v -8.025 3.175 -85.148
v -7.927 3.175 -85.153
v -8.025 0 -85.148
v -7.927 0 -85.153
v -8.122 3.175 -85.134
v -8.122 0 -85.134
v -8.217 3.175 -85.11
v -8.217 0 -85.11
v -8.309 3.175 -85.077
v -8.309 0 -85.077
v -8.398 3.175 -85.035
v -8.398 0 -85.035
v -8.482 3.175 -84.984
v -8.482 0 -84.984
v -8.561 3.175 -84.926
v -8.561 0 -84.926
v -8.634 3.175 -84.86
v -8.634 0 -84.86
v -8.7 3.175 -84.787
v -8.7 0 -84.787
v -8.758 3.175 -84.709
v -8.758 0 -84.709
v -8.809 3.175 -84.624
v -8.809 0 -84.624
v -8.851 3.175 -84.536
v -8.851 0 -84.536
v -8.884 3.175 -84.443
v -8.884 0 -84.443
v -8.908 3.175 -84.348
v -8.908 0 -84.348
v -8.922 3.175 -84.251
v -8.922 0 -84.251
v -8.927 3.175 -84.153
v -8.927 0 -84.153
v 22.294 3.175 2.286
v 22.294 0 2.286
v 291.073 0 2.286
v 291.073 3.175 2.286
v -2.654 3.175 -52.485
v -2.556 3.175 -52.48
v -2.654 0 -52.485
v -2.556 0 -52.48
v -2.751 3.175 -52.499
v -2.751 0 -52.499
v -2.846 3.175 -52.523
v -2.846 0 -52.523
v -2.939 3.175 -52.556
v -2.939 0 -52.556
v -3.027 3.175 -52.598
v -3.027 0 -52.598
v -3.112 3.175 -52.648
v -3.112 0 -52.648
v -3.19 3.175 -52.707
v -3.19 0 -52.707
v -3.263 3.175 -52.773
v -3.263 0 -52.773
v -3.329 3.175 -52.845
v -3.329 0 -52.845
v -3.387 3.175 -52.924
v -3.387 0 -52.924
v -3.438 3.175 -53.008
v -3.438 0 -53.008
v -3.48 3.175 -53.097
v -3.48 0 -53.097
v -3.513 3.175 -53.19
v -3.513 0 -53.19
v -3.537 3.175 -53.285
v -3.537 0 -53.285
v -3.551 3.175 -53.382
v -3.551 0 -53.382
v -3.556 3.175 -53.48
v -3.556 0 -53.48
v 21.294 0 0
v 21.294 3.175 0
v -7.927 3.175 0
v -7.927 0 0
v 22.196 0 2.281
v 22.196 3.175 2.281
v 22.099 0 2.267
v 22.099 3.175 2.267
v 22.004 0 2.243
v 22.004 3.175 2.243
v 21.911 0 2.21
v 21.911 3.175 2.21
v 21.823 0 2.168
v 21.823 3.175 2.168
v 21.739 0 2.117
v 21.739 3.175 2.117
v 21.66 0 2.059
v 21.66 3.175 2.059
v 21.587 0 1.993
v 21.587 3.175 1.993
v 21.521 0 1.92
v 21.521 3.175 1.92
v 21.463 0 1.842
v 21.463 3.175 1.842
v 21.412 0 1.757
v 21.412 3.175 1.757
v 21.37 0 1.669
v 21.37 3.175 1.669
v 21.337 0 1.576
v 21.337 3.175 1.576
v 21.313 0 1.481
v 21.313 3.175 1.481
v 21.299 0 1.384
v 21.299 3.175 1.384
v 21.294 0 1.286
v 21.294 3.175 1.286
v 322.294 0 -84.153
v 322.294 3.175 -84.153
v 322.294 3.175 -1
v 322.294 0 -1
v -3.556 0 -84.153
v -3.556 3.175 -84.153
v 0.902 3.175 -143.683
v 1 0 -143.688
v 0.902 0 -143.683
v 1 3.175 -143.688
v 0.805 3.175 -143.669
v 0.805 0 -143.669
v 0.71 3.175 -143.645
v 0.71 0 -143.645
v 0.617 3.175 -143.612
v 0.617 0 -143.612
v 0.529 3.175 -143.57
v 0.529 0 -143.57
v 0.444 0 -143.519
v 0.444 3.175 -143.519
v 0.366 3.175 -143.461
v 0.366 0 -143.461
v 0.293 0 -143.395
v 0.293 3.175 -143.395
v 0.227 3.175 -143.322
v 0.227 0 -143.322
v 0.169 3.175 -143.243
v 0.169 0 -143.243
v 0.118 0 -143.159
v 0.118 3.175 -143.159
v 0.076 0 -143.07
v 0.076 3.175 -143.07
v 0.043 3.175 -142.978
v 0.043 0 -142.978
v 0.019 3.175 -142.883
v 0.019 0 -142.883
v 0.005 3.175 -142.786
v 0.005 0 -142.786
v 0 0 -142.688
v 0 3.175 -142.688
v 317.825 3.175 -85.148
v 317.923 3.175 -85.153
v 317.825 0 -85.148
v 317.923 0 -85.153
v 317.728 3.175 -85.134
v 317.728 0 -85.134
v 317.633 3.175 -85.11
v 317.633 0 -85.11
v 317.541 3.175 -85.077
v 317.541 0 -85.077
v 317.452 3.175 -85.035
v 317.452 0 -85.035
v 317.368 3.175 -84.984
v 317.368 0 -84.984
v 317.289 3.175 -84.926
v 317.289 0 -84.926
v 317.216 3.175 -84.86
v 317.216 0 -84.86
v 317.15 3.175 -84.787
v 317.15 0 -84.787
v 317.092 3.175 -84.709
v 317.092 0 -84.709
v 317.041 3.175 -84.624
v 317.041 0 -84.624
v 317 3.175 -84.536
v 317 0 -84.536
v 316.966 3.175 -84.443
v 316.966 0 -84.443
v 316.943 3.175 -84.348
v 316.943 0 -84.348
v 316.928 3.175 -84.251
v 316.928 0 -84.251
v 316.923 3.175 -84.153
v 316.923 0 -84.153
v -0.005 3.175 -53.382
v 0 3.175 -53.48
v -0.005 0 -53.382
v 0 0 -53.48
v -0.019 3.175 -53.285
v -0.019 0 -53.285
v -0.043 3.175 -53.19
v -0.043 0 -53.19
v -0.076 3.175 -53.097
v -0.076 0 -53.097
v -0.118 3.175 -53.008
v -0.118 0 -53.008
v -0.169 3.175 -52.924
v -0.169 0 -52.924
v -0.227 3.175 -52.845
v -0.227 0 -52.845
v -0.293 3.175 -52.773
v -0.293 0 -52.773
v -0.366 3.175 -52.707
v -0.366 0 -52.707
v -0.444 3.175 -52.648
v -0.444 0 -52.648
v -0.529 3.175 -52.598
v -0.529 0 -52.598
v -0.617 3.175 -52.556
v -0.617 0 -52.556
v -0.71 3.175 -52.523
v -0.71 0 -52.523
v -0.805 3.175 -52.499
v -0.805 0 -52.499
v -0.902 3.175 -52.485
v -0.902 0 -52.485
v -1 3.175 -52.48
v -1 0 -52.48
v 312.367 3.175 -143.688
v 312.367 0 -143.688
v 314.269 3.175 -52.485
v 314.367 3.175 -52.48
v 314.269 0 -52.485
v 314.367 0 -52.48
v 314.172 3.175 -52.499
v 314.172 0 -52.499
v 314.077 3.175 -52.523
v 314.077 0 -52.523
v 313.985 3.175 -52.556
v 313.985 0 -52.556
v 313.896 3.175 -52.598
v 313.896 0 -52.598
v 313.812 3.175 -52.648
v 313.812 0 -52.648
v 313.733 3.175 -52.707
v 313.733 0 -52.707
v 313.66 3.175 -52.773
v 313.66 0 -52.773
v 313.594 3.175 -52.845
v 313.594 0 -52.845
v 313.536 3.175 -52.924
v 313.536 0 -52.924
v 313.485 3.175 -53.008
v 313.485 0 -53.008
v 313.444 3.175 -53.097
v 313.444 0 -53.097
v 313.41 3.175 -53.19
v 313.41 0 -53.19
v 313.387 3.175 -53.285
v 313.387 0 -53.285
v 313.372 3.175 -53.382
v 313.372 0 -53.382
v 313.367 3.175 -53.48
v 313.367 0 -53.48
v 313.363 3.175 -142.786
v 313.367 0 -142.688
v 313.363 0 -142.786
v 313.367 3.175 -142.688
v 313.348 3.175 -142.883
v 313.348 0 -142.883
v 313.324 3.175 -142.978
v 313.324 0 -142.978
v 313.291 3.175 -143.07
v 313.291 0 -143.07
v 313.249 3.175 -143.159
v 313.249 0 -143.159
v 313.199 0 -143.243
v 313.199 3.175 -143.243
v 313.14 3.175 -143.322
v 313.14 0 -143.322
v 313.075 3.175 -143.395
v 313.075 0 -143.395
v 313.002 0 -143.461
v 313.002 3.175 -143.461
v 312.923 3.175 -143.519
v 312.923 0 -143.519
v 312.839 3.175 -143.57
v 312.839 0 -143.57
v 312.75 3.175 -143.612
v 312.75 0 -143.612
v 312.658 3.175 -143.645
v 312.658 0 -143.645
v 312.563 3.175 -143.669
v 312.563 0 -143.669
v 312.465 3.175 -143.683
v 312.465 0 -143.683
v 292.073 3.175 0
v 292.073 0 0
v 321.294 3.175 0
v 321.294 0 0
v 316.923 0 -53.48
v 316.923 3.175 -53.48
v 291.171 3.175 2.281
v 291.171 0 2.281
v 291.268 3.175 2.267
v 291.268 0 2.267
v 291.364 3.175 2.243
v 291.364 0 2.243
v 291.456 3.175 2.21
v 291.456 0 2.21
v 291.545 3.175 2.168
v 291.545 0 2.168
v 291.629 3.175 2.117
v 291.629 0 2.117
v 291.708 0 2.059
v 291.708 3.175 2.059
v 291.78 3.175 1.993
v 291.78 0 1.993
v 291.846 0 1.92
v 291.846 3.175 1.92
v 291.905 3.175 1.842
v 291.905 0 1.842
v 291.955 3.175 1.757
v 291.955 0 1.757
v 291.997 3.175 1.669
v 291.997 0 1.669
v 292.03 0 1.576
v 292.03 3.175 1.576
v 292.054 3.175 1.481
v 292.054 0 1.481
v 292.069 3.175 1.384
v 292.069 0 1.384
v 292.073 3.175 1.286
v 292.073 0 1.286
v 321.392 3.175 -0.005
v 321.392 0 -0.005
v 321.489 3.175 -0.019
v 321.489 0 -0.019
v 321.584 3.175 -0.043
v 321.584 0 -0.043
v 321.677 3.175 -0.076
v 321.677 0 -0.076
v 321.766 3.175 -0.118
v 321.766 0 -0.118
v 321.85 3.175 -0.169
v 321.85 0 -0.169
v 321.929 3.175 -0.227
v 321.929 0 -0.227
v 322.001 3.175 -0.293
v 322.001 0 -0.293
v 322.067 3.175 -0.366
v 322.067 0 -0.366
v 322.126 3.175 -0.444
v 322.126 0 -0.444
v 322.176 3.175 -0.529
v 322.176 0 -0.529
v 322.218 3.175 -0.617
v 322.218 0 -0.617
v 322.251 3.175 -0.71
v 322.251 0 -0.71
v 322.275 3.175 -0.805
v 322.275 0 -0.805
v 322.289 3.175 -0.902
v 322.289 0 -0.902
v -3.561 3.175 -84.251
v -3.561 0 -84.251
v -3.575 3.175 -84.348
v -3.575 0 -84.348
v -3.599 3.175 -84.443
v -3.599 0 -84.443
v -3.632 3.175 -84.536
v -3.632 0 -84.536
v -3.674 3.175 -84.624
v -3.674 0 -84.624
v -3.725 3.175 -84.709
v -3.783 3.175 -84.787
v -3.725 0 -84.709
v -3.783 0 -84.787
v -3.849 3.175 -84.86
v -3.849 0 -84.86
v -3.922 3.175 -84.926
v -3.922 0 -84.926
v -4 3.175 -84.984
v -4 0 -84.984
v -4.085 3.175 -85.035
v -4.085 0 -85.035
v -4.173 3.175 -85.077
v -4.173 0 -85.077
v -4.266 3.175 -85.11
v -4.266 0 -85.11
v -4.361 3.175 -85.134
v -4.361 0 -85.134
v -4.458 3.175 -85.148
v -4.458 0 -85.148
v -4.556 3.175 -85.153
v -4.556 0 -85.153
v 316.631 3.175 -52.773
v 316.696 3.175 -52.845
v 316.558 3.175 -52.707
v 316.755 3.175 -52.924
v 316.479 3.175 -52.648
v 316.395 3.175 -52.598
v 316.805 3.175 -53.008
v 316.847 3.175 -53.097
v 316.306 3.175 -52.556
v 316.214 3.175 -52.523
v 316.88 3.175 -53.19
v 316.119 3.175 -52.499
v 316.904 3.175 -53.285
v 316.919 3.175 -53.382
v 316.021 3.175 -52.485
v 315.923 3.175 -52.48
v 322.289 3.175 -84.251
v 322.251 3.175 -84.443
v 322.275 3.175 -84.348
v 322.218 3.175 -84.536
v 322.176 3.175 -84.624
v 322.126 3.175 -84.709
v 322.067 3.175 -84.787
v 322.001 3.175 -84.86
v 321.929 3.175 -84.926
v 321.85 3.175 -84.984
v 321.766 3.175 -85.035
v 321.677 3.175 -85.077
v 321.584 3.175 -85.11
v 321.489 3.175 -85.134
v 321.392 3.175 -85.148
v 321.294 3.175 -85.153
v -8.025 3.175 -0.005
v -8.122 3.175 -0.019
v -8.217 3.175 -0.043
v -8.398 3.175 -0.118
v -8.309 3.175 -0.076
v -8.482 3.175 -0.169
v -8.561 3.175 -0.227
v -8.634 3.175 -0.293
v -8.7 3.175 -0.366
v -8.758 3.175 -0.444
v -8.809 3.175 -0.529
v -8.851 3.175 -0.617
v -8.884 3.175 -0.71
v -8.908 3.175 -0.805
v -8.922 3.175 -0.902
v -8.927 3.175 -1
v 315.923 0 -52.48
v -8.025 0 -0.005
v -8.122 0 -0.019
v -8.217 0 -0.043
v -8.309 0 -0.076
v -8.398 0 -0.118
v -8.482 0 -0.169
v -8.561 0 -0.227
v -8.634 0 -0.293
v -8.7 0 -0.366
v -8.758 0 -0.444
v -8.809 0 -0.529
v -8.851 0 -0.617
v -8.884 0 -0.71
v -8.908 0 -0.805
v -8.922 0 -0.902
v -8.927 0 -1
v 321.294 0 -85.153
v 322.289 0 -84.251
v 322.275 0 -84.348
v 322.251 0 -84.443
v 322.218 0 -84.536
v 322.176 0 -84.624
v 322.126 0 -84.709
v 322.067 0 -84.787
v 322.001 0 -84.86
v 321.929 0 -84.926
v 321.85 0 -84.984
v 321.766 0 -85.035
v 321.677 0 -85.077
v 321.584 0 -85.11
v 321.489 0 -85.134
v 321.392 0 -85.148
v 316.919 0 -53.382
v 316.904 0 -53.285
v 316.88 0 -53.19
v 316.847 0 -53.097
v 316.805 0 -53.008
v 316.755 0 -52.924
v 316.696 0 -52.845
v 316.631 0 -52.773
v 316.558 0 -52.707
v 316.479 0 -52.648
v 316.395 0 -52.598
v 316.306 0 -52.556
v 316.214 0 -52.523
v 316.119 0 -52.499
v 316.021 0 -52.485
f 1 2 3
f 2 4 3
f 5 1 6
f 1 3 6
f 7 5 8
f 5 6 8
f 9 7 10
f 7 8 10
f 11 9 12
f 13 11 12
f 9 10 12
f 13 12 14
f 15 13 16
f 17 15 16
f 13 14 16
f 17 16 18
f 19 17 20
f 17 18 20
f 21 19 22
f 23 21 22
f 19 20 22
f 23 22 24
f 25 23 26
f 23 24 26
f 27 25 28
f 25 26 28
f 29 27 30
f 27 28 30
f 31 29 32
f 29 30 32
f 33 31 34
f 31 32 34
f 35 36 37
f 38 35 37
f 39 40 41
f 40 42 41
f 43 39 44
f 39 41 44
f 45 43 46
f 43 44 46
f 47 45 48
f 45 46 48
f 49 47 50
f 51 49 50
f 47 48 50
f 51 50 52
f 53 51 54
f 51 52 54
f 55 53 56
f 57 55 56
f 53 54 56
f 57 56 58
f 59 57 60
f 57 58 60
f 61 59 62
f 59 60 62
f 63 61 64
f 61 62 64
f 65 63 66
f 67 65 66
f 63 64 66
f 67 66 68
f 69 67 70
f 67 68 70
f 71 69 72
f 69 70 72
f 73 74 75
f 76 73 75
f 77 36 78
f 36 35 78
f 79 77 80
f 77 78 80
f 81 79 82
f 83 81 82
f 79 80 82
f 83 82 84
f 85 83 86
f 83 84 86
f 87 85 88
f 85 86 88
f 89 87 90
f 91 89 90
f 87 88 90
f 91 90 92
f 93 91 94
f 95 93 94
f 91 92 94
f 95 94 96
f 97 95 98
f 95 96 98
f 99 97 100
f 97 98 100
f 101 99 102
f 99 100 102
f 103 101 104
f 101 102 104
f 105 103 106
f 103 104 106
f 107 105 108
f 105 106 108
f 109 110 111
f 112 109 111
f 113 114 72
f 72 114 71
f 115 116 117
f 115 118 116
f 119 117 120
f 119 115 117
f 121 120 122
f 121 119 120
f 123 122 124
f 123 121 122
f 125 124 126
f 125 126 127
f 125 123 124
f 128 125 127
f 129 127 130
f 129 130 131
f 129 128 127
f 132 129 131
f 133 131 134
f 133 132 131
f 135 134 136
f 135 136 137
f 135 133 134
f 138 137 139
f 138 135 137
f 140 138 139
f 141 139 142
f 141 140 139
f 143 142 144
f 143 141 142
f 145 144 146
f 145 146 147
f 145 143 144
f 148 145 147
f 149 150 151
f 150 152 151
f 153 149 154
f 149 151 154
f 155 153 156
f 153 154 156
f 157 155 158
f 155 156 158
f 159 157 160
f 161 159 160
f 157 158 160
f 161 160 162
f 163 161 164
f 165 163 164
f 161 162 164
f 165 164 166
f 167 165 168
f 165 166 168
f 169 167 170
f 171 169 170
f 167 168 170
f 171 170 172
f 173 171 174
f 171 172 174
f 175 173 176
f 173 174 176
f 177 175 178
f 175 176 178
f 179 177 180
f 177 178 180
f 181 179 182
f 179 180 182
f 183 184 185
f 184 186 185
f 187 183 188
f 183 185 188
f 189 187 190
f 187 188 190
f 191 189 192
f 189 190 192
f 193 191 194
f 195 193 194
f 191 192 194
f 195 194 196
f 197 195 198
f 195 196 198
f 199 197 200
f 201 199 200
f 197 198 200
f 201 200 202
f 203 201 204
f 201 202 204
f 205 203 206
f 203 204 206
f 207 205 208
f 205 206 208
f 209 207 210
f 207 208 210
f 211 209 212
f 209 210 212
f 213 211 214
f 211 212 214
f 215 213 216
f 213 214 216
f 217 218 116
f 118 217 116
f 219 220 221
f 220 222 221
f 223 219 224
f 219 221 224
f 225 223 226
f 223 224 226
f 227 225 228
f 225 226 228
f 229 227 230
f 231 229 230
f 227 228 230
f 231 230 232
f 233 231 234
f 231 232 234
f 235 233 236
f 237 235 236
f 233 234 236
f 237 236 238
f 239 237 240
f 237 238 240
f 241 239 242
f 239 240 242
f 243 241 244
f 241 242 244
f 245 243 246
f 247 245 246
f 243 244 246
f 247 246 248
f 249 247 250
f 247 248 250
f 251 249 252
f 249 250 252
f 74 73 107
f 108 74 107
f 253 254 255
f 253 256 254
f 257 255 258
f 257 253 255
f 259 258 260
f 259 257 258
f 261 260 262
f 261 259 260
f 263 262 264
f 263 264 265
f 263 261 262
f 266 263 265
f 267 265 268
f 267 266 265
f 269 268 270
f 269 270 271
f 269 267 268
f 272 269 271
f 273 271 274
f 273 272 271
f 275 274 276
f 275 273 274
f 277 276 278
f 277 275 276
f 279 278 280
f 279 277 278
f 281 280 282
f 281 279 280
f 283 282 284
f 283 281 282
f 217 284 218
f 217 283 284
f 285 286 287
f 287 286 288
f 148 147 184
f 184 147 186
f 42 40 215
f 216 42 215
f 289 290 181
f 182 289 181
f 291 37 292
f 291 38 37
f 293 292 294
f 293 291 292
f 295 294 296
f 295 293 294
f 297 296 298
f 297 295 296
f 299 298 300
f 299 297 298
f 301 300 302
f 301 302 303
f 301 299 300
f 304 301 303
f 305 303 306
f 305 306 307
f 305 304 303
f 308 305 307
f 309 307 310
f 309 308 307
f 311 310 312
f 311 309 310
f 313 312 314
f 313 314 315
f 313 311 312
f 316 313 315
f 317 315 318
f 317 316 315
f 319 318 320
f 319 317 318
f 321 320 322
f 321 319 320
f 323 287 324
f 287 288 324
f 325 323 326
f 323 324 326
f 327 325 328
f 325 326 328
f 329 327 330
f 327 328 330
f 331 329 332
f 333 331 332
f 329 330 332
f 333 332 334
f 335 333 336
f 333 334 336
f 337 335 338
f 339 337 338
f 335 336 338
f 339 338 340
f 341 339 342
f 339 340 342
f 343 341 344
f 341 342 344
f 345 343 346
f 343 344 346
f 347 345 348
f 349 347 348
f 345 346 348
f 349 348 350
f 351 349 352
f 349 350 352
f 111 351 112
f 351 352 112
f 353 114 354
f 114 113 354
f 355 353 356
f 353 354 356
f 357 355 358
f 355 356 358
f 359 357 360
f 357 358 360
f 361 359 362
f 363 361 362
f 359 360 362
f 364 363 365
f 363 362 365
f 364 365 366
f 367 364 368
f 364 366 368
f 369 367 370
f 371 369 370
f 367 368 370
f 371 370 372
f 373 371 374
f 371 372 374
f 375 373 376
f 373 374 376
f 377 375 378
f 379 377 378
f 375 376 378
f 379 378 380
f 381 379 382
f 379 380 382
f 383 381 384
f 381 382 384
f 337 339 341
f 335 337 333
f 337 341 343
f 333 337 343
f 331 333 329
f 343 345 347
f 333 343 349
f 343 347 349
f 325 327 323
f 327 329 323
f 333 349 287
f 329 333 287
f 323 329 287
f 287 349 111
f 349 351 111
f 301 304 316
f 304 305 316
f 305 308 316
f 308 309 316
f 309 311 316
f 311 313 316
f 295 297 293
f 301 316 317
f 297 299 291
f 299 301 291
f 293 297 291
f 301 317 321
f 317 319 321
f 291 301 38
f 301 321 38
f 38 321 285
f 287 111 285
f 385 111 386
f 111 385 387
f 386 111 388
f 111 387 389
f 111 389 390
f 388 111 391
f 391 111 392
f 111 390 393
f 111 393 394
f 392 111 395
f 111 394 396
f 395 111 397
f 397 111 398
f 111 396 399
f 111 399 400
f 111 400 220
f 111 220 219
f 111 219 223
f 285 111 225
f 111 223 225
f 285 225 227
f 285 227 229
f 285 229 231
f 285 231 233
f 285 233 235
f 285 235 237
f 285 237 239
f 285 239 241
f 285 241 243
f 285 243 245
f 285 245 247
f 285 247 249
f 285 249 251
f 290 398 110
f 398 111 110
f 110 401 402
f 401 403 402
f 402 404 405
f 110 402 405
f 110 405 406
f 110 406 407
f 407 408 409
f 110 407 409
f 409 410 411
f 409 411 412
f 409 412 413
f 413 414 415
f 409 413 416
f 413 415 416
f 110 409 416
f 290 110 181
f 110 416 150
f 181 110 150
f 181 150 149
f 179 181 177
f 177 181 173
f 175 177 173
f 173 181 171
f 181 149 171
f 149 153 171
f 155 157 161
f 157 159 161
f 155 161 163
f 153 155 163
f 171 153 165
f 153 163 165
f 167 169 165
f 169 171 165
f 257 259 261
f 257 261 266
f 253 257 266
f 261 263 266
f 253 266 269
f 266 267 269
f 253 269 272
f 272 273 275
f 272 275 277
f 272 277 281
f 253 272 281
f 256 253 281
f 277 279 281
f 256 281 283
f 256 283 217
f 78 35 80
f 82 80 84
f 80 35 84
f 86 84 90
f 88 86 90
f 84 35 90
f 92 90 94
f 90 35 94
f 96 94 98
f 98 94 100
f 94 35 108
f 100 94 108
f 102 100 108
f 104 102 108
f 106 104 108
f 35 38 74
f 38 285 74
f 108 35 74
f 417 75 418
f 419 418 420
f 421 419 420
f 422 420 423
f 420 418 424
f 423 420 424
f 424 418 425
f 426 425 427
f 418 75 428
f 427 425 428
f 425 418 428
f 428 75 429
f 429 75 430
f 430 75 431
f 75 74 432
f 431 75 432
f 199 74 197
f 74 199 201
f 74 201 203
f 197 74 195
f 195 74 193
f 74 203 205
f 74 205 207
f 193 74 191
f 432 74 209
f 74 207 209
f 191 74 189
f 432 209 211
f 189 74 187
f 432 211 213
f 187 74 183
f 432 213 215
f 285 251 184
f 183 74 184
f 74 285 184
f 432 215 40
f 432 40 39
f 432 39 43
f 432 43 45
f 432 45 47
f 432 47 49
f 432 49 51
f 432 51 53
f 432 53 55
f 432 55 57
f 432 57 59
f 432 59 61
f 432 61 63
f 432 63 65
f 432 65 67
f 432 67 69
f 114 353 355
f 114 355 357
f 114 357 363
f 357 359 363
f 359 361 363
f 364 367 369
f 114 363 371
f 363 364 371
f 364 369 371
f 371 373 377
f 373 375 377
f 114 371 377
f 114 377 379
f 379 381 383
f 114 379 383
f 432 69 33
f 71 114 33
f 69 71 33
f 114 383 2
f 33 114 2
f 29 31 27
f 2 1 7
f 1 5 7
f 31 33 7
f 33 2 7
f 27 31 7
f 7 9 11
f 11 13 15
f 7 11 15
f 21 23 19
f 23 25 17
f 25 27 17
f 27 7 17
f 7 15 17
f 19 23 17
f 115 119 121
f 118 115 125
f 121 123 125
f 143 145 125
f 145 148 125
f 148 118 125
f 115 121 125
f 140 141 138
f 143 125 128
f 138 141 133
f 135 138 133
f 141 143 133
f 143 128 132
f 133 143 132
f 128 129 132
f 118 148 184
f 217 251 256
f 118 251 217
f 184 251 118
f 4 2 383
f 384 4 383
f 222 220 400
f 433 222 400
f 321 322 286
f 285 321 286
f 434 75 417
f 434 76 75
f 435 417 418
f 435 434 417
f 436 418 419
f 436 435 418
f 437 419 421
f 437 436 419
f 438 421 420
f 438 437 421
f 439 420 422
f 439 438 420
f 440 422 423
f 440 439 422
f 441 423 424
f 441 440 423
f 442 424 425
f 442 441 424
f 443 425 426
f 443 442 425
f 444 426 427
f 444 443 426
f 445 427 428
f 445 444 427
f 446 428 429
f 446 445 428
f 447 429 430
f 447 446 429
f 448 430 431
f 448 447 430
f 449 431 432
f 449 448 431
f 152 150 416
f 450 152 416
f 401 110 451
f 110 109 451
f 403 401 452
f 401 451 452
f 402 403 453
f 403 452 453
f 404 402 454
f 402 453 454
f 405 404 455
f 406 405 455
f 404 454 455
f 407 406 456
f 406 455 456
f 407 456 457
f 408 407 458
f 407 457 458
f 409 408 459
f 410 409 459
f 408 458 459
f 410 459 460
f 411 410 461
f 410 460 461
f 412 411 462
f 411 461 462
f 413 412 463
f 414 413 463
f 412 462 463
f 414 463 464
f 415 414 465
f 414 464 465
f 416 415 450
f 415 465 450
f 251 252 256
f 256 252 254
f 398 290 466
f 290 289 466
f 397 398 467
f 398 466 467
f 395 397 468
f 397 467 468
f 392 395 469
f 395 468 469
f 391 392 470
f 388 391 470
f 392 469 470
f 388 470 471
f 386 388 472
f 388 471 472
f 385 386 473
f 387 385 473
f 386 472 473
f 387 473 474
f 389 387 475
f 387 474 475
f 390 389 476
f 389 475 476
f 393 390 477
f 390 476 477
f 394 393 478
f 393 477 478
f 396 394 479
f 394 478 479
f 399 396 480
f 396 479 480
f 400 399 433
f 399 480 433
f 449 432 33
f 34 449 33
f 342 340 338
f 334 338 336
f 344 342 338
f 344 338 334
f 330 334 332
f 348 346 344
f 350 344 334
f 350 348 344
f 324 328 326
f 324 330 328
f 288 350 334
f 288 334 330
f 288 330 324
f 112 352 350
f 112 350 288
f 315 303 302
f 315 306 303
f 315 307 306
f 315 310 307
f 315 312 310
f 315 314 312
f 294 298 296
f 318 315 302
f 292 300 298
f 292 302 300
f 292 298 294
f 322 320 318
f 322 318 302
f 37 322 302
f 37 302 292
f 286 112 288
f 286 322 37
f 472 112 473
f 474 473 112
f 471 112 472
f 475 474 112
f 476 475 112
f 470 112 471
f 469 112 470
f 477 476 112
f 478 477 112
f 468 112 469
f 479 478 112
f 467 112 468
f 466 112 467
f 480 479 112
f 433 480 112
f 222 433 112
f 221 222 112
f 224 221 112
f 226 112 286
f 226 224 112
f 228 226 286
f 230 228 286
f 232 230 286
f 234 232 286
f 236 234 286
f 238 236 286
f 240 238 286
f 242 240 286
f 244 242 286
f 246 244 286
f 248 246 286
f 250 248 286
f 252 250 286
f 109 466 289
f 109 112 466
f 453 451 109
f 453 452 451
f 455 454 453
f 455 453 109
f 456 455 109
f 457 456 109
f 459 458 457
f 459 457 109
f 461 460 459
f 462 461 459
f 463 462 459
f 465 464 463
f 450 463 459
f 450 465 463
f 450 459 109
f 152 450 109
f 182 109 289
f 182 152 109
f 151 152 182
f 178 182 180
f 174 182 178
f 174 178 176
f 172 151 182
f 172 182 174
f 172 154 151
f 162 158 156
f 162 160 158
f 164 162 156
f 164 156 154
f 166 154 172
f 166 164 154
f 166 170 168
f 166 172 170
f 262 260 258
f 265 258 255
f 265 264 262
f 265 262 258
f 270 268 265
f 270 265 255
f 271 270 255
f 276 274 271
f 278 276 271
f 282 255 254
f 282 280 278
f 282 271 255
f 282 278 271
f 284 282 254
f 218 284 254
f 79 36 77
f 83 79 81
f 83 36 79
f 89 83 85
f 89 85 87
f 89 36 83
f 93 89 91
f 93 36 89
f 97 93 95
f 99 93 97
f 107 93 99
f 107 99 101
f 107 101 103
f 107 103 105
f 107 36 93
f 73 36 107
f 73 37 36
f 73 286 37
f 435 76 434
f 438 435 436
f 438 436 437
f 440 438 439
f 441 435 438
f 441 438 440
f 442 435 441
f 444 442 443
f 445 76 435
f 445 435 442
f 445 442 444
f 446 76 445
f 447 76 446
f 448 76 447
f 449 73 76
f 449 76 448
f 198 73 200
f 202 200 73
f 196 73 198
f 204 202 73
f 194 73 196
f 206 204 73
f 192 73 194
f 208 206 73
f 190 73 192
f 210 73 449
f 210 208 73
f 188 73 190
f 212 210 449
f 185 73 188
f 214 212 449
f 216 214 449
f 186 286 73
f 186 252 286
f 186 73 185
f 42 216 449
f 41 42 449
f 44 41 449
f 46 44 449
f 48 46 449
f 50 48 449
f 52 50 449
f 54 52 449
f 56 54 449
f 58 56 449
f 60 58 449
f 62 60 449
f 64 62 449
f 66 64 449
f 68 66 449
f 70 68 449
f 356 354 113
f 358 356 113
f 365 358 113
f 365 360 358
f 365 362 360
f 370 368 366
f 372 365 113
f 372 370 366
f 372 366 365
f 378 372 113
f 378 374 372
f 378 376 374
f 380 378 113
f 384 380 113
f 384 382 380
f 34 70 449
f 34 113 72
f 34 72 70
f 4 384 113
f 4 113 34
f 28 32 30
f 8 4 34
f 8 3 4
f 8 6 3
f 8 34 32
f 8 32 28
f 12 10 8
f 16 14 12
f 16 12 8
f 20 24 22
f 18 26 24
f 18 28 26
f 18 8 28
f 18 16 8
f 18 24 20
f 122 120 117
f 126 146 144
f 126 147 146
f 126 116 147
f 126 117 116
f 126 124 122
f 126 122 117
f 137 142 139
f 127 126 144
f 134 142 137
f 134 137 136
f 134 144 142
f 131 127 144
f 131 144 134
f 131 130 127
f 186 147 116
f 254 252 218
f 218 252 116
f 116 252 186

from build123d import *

# Parameters (mm, degrees)
BOSS_EXTRUDE1_DEPTH = 3.175
BOSS_EXTRUDE2_DEPTH = 3.175
FILLET1_R           = 1


with BuildPart() as part:
    # Sketch1 → Boss-Extrude1 (new body)
    with BuildSketch(Plane(origin=(0, 0, 0), x_dir=(1, 0, 0), z_dir=(0, 1, 0))):
        Polygon((292.07333, 0), (313.36742, 0), (313.36742, 143.6878), (0, 143.6878), (0, 0), (21.29409, 0), (21.29409, -2.286), (292.07333, -2.286), align=None)
    extrude(amount=BOSS_EXTRUDE1_DEPTH)

    # Sketch2 → Boss-Extrude2 (add, through all)
    with BuildSketch(Plane(origin=(0, 3.175, 0), x_dir=(1, 0, 0), z_dir=(0, 1, 0))):
        Polygon((0, 0), (-8.926719258, 0), (-8.926719258, 85.152975238), (-3.556, 85.152975238), (-3.556, 52.479835837), (0, 52.479835837), align=None)
        Polygon((313.36742, 52.479835837), (316.92342, 52.479835837), (316.92342, 85.152975238), (322.294139258, 85.152975238), (322.294139258, 0), (313.36742, 0), align=None)
    extrude(amount=-BOSS_EXTRUDE2_DEPTH)

    # Fillet1
    fillet1_edges = [part.edges().sort_by_distance(p)[0] for p in [
        (0, 1.5875, -143.6878),
        (313.36742, 1.5875, -143.6878),
        (292.07333, 1.5875, 2.286),
        (21.29409, 1.5875, 2.286),
        (0, 1.5875, -52.479835837),
        (-8.926719258, 1.5875, 0),
        (-8.926719258, 1.5875, -85.152975238),
        (-3.556, 1.5875, -85.152975238),
        (-3.556, 1.5875, -52.479835837),
        (313.36742, 1.5875, -52.479835837),
        (316.92342, 1.5875, -52.479835837),
        (316.92342, 1.5875, -85.152975238),
        (322.294139258, 1.5875, -85.152975238),
        (322.294139258, 1.5875, 0),
    ]]
    fillet(fillet1_edges, radius=FILLET1_R)


solid = part.part
